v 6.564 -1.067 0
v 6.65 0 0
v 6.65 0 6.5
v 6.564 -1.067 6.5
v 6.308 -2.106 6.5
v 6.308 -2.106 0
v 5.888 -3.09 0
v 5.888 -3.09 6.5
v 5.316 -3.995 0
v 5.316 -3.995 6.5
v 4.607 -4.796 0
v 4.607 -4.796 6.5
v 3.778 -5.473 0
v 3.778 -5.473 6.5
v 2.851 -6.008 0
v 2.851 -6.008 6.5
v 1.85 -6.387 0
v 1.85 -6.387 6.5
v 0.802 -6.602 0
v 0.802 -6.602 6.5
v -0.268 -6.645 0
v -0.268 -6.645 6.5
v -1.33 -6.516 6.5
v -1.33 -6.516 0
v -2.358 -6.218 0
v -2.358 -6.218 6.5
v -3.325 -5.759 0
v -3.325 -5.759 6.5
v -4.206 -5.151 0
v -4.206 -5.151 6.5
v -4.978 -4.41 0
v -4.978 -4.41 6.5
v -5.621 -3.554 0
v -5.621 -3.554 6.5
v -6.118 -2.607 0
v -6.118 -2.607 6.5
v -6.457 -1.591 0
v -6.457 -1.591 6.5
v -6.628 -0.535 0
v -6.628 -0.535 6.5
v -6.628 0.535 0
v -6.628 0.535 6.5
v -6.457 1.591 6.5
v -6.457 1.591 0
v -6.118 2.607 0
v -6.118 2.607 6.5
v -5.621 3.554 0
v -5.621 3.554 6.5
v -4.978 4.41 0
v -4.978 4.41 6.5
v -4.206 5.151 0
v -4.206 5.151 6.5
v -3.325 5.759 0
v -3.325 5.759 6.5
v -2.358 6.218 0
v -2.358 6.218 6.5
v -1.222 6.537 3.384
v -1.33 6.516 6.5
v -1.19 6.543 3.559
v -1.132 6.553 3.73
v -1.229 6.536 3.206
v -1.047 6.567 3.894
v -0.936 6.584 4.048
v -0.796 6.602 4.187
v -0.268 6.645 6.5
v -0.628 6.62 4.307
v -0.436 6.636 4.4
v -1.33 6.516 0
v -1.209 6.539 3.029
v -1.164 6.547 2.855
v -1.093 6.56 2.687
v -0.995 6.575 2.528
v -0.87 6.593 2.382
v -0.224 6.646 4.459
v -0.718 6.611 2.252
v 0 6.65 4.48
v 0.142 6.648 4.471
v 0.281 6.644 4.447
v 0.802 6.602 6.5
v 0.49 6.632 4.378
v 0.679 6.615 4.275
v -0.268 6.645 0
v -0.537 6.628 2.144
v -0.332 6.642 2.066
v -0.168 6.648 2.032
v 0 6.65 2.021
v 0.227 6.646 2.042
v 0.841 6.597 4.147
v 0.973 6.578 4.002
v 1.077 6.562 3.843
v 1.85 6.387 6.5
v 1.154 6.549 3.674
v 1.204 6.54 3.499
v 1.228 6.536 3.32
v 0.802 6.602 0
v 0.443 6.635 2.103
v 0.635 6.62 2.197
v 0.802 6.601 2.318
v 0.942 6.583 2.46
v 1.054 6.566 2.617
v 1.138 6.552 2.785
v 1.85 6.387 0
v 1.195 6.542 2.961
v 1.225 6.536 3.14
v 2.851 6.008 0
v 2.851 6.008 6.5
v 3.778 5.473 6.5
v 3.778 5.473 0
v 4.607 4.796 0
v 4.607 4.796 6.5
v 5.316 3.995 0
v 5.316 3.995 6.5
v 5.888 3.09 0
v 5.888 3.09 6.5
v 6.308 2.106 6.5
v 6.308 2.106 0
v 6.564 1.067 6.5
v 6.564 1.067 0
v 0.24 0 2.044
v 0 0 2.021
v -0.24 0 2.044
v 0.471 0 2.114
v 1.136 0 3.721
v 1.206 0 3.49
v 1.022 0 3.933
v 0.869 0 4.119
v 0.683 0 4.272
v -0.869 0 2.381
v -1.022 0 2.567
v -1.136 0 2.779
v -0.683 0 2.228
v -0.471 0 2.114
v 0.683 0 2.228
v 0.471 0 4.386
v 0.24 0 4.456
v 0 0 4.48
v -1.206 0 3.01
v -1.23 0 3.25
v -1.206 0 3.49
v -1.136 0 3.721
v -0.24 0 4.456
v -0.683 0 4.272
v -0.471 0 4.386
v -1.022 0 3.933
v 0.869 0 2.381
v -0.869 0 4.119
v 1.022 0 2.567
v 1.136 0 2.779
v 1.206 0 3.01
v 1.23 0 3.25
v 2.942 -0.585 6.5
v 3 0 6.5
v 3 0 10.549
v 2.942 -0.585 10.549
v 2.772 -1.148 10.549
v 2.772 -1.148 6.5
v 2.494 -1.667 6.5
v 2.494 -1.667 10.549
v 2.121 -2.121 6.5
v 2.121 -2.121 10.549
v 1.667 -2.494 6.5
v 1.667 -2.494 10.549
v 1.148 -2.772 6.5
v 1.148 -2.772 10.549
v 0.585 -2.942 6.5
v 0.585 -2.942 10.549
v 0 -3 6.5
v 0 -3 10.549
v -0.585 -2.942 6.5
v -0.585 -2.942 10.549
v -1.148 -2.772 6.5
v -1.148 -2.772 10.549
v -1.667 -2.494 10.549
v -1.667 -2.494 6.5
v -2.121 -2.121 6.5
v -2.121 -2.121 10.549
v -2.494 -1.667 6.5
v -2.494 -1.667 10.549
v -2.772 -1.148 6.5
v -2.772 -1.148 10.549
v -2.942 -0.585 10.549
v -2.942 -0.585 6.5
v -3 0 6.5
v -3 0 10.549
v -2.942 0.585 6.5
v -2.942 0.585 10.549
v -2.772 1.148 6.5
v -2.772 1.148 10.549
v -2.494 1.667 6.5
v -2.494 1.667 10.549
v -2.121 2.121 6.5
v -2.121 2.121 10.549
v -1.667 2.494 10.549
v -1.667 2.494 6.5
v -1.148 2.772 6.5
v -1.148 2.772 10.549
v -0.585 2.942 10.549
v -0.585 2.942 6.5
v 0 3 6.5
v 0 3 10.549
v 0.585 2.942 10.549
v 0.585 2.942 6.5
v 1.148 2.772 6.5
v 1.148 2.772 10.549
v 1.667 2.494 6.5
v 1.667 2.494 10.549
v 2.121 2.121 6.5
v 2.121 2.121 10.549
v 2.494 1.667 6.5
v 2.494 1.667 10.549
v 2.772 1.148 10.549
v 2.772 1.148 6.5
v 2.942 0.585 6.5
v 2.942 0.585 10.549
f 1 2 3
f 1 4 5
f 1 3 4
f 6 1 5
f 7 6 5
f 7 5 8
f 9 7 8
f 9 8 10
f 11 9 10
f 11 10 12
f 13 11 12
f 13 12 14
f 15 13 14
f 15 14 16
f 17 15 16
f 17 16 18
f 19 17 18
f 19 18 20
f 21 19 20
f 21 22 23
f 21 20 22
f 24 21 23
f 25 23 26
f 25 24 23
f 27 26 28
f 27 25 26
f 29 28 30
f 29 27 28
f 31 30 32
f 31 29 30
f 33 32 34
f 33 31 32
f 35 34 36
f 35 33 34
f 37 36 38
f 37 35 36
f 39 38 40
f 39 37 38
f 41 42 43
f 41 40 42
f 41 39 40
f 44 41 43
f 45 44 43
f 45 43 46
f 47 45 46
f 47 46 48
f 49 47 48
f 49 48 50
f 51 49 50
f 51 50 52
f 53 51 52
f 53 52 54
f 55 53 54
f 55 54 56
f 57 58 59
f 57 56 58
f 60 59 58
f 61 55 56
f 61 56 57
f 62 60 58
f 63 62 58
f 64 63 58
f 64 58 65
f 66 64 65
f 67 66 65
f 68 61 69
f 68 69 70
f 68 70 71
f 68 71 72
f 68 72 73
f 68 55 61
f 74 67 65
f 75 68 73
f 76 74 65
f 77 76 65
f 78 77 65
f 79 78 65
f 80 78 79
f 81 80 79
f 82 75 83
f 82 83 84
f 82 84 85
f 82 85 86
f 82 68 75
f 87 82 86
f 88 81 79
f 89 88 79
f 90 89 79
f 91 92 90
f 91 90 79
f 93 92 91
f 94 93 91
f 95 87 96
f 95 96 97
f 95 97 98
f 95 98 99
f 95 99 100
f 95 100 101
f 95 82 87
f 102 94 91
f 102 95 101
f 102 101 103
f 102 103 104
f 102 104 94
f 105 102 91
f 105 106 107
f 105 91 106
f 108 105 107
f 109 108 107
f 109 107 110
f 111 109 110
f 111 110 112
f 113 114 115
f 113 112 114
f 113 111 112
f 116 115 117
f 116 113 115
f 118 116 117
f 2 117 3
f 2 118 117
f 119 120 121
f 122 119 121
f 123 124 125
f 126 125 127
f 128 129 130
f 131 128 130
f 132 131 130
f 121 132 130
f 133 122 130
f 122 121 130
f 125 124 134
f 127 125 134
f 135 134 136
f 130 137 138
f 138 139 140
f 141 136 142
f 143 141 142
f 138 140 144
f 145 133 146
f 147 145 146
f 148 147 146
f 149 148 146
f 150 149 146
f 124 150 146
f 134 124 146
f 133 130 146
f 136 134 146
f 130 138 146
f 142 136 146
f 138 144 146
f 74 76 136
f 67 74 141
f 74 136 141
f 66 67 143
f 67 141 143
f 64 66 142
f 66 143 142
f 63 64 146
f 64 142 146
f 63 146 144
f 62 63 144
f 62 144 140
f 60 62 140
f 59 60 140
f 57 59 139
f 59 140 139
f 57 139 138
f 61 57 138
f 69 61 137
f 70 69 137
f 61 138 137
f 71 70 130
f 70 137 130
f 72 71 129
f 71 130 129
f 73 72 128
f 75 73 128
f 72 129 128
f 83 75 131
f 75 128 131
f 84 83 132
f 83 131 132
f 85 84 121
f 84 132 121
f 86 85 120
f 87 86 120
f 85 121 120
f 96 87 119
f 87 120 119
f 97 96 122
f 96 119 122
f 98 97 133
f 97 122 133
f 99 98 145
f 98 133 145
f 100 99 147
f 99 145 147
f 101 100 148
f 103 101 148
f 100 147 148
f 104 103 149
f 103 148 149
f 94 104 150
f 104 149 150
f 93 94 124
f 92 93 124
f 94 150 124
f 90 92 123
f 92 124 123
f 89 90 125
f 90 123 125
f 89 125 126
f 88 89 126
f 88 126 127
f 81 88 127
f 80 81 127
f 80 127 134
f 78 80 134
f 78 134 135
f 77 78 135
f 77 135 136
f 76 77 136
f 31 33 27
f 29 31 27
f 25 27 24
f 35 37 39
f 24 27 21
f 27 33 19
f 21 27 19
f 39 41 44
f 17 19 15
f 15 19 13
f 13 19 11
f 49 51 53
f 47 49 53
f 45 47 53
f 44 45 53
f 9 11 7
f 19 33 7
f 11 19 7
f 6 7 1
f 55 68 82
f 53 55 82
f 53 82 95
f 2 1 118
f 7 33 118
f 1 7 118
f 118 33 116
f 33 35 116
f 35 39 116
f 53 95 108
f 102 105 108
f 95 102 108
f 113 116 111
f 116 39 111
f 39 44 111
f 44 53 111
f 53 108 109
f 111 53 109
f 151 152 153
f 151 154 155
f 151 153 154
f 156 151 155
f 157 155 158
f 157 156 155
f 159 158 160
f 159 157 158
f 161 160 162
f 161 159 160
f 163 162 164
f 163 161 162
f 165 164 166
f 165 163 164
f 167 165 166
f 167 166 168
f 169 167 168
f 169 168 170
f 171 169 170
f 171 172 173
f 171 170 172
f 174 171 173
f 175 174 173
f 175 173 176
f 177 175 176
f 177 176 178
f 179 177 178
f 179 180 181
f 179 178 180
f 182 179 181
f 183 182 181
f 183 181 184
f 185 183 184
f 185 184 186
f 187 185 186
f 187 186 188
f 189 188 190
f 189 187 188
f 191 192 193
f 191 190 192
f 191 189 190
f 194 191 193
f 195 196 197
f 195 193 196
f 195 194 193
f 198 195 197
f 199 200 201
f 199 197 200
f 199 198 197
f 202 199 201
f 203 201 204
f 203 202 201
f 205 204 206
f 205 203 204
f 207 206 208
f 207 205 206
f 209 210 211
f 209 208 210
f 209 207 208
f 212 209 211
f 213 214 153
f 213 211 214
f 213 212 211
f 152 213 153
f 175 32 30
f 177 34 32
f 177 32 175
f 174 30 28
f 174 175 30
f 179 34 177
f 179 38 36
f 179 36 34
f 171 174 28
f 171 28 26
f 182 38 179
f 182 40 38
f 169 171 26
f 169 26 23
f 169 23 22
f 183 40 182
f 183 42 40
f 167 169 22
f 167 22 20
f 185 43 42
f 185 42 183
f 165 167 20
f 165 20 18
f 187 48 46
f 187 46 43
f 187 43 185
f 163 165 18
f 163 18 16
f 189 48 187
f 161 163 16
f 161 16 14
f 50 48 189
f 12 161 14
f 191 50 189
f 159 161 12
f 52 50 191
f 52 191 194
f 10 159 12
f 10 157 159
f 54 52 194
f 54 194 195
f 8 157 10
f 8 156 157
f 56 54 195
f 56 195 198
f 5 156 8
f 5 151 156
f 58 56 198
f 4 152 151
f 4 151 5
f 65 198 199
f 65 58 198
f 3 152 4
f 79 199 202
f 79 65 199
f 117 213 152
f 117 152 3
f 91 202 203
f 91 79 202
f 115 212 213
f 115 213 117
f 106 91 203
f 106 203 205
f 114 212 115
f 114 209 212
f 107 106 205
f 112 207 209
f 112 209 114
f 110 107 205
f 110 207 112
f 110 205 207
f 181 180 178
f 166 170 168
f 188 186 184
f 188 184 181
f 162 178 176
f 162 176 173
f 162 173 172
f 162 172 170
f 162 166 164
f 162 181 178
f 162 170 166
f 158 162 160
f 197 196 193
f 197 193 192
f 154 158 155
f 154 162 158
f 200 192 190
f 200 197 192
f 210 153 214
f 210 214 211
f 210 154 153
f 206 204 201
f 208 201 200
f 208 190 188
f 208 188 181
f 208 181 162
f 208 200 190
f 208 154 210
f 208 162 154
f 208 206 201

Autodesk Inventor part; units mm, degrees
ref_plane "YZ Plane" through (0, 0, 0) normal (1, 0, 0) x (0, 1, 0)
ref_plane "XZ Plane" through (0, 0, 0) normal (0, 1, 0) x (-1, 0, 0)
sketch "Sketch1" plane through (0, 0, 0) normal (0, 0, 1) x (1, 0, 0)
  circle A0 centre (0, 0) radius 6.65
  dimension "d0" = 13.3
extrude "Extrusion1" add sketch "Sketch1" along normal blind 6.5
ref_plane "Work Plane1" through (-6.65, 6.65, 6.5) normal (0, 1, 0) x (1, 0, 0)
sketch "Sketch3" plane through (-6.65, 6.65, 6.5) normal (0, 1, 0) x (1, 0, 0)
  circle A0 centre (6.65, 3.25) radius 1.2
  dimension "d9" = 2.4
hole "Hole1" at (0, 6.65, 3.25) direction (0, -1, 0) diameter 2.459 depth 6.65 thread size "M3x0.5" designation "M3" class "6H" standard "GB Metric profile"
sketch "Sketch4" plane through (0, 0, 6.5) normal (0, 0, 1) x (1, 0, 0)
  circle A0 centre (0, 0) radius 6.65 projected
  circle A1 centre (0, 0) radius 3
  dimension "d17" = 6
extrude "Extrusion3" add sketch "Sketch4" along normal blind 4.049 contours A1
properties part number "hridel kuzelova kolecka"
